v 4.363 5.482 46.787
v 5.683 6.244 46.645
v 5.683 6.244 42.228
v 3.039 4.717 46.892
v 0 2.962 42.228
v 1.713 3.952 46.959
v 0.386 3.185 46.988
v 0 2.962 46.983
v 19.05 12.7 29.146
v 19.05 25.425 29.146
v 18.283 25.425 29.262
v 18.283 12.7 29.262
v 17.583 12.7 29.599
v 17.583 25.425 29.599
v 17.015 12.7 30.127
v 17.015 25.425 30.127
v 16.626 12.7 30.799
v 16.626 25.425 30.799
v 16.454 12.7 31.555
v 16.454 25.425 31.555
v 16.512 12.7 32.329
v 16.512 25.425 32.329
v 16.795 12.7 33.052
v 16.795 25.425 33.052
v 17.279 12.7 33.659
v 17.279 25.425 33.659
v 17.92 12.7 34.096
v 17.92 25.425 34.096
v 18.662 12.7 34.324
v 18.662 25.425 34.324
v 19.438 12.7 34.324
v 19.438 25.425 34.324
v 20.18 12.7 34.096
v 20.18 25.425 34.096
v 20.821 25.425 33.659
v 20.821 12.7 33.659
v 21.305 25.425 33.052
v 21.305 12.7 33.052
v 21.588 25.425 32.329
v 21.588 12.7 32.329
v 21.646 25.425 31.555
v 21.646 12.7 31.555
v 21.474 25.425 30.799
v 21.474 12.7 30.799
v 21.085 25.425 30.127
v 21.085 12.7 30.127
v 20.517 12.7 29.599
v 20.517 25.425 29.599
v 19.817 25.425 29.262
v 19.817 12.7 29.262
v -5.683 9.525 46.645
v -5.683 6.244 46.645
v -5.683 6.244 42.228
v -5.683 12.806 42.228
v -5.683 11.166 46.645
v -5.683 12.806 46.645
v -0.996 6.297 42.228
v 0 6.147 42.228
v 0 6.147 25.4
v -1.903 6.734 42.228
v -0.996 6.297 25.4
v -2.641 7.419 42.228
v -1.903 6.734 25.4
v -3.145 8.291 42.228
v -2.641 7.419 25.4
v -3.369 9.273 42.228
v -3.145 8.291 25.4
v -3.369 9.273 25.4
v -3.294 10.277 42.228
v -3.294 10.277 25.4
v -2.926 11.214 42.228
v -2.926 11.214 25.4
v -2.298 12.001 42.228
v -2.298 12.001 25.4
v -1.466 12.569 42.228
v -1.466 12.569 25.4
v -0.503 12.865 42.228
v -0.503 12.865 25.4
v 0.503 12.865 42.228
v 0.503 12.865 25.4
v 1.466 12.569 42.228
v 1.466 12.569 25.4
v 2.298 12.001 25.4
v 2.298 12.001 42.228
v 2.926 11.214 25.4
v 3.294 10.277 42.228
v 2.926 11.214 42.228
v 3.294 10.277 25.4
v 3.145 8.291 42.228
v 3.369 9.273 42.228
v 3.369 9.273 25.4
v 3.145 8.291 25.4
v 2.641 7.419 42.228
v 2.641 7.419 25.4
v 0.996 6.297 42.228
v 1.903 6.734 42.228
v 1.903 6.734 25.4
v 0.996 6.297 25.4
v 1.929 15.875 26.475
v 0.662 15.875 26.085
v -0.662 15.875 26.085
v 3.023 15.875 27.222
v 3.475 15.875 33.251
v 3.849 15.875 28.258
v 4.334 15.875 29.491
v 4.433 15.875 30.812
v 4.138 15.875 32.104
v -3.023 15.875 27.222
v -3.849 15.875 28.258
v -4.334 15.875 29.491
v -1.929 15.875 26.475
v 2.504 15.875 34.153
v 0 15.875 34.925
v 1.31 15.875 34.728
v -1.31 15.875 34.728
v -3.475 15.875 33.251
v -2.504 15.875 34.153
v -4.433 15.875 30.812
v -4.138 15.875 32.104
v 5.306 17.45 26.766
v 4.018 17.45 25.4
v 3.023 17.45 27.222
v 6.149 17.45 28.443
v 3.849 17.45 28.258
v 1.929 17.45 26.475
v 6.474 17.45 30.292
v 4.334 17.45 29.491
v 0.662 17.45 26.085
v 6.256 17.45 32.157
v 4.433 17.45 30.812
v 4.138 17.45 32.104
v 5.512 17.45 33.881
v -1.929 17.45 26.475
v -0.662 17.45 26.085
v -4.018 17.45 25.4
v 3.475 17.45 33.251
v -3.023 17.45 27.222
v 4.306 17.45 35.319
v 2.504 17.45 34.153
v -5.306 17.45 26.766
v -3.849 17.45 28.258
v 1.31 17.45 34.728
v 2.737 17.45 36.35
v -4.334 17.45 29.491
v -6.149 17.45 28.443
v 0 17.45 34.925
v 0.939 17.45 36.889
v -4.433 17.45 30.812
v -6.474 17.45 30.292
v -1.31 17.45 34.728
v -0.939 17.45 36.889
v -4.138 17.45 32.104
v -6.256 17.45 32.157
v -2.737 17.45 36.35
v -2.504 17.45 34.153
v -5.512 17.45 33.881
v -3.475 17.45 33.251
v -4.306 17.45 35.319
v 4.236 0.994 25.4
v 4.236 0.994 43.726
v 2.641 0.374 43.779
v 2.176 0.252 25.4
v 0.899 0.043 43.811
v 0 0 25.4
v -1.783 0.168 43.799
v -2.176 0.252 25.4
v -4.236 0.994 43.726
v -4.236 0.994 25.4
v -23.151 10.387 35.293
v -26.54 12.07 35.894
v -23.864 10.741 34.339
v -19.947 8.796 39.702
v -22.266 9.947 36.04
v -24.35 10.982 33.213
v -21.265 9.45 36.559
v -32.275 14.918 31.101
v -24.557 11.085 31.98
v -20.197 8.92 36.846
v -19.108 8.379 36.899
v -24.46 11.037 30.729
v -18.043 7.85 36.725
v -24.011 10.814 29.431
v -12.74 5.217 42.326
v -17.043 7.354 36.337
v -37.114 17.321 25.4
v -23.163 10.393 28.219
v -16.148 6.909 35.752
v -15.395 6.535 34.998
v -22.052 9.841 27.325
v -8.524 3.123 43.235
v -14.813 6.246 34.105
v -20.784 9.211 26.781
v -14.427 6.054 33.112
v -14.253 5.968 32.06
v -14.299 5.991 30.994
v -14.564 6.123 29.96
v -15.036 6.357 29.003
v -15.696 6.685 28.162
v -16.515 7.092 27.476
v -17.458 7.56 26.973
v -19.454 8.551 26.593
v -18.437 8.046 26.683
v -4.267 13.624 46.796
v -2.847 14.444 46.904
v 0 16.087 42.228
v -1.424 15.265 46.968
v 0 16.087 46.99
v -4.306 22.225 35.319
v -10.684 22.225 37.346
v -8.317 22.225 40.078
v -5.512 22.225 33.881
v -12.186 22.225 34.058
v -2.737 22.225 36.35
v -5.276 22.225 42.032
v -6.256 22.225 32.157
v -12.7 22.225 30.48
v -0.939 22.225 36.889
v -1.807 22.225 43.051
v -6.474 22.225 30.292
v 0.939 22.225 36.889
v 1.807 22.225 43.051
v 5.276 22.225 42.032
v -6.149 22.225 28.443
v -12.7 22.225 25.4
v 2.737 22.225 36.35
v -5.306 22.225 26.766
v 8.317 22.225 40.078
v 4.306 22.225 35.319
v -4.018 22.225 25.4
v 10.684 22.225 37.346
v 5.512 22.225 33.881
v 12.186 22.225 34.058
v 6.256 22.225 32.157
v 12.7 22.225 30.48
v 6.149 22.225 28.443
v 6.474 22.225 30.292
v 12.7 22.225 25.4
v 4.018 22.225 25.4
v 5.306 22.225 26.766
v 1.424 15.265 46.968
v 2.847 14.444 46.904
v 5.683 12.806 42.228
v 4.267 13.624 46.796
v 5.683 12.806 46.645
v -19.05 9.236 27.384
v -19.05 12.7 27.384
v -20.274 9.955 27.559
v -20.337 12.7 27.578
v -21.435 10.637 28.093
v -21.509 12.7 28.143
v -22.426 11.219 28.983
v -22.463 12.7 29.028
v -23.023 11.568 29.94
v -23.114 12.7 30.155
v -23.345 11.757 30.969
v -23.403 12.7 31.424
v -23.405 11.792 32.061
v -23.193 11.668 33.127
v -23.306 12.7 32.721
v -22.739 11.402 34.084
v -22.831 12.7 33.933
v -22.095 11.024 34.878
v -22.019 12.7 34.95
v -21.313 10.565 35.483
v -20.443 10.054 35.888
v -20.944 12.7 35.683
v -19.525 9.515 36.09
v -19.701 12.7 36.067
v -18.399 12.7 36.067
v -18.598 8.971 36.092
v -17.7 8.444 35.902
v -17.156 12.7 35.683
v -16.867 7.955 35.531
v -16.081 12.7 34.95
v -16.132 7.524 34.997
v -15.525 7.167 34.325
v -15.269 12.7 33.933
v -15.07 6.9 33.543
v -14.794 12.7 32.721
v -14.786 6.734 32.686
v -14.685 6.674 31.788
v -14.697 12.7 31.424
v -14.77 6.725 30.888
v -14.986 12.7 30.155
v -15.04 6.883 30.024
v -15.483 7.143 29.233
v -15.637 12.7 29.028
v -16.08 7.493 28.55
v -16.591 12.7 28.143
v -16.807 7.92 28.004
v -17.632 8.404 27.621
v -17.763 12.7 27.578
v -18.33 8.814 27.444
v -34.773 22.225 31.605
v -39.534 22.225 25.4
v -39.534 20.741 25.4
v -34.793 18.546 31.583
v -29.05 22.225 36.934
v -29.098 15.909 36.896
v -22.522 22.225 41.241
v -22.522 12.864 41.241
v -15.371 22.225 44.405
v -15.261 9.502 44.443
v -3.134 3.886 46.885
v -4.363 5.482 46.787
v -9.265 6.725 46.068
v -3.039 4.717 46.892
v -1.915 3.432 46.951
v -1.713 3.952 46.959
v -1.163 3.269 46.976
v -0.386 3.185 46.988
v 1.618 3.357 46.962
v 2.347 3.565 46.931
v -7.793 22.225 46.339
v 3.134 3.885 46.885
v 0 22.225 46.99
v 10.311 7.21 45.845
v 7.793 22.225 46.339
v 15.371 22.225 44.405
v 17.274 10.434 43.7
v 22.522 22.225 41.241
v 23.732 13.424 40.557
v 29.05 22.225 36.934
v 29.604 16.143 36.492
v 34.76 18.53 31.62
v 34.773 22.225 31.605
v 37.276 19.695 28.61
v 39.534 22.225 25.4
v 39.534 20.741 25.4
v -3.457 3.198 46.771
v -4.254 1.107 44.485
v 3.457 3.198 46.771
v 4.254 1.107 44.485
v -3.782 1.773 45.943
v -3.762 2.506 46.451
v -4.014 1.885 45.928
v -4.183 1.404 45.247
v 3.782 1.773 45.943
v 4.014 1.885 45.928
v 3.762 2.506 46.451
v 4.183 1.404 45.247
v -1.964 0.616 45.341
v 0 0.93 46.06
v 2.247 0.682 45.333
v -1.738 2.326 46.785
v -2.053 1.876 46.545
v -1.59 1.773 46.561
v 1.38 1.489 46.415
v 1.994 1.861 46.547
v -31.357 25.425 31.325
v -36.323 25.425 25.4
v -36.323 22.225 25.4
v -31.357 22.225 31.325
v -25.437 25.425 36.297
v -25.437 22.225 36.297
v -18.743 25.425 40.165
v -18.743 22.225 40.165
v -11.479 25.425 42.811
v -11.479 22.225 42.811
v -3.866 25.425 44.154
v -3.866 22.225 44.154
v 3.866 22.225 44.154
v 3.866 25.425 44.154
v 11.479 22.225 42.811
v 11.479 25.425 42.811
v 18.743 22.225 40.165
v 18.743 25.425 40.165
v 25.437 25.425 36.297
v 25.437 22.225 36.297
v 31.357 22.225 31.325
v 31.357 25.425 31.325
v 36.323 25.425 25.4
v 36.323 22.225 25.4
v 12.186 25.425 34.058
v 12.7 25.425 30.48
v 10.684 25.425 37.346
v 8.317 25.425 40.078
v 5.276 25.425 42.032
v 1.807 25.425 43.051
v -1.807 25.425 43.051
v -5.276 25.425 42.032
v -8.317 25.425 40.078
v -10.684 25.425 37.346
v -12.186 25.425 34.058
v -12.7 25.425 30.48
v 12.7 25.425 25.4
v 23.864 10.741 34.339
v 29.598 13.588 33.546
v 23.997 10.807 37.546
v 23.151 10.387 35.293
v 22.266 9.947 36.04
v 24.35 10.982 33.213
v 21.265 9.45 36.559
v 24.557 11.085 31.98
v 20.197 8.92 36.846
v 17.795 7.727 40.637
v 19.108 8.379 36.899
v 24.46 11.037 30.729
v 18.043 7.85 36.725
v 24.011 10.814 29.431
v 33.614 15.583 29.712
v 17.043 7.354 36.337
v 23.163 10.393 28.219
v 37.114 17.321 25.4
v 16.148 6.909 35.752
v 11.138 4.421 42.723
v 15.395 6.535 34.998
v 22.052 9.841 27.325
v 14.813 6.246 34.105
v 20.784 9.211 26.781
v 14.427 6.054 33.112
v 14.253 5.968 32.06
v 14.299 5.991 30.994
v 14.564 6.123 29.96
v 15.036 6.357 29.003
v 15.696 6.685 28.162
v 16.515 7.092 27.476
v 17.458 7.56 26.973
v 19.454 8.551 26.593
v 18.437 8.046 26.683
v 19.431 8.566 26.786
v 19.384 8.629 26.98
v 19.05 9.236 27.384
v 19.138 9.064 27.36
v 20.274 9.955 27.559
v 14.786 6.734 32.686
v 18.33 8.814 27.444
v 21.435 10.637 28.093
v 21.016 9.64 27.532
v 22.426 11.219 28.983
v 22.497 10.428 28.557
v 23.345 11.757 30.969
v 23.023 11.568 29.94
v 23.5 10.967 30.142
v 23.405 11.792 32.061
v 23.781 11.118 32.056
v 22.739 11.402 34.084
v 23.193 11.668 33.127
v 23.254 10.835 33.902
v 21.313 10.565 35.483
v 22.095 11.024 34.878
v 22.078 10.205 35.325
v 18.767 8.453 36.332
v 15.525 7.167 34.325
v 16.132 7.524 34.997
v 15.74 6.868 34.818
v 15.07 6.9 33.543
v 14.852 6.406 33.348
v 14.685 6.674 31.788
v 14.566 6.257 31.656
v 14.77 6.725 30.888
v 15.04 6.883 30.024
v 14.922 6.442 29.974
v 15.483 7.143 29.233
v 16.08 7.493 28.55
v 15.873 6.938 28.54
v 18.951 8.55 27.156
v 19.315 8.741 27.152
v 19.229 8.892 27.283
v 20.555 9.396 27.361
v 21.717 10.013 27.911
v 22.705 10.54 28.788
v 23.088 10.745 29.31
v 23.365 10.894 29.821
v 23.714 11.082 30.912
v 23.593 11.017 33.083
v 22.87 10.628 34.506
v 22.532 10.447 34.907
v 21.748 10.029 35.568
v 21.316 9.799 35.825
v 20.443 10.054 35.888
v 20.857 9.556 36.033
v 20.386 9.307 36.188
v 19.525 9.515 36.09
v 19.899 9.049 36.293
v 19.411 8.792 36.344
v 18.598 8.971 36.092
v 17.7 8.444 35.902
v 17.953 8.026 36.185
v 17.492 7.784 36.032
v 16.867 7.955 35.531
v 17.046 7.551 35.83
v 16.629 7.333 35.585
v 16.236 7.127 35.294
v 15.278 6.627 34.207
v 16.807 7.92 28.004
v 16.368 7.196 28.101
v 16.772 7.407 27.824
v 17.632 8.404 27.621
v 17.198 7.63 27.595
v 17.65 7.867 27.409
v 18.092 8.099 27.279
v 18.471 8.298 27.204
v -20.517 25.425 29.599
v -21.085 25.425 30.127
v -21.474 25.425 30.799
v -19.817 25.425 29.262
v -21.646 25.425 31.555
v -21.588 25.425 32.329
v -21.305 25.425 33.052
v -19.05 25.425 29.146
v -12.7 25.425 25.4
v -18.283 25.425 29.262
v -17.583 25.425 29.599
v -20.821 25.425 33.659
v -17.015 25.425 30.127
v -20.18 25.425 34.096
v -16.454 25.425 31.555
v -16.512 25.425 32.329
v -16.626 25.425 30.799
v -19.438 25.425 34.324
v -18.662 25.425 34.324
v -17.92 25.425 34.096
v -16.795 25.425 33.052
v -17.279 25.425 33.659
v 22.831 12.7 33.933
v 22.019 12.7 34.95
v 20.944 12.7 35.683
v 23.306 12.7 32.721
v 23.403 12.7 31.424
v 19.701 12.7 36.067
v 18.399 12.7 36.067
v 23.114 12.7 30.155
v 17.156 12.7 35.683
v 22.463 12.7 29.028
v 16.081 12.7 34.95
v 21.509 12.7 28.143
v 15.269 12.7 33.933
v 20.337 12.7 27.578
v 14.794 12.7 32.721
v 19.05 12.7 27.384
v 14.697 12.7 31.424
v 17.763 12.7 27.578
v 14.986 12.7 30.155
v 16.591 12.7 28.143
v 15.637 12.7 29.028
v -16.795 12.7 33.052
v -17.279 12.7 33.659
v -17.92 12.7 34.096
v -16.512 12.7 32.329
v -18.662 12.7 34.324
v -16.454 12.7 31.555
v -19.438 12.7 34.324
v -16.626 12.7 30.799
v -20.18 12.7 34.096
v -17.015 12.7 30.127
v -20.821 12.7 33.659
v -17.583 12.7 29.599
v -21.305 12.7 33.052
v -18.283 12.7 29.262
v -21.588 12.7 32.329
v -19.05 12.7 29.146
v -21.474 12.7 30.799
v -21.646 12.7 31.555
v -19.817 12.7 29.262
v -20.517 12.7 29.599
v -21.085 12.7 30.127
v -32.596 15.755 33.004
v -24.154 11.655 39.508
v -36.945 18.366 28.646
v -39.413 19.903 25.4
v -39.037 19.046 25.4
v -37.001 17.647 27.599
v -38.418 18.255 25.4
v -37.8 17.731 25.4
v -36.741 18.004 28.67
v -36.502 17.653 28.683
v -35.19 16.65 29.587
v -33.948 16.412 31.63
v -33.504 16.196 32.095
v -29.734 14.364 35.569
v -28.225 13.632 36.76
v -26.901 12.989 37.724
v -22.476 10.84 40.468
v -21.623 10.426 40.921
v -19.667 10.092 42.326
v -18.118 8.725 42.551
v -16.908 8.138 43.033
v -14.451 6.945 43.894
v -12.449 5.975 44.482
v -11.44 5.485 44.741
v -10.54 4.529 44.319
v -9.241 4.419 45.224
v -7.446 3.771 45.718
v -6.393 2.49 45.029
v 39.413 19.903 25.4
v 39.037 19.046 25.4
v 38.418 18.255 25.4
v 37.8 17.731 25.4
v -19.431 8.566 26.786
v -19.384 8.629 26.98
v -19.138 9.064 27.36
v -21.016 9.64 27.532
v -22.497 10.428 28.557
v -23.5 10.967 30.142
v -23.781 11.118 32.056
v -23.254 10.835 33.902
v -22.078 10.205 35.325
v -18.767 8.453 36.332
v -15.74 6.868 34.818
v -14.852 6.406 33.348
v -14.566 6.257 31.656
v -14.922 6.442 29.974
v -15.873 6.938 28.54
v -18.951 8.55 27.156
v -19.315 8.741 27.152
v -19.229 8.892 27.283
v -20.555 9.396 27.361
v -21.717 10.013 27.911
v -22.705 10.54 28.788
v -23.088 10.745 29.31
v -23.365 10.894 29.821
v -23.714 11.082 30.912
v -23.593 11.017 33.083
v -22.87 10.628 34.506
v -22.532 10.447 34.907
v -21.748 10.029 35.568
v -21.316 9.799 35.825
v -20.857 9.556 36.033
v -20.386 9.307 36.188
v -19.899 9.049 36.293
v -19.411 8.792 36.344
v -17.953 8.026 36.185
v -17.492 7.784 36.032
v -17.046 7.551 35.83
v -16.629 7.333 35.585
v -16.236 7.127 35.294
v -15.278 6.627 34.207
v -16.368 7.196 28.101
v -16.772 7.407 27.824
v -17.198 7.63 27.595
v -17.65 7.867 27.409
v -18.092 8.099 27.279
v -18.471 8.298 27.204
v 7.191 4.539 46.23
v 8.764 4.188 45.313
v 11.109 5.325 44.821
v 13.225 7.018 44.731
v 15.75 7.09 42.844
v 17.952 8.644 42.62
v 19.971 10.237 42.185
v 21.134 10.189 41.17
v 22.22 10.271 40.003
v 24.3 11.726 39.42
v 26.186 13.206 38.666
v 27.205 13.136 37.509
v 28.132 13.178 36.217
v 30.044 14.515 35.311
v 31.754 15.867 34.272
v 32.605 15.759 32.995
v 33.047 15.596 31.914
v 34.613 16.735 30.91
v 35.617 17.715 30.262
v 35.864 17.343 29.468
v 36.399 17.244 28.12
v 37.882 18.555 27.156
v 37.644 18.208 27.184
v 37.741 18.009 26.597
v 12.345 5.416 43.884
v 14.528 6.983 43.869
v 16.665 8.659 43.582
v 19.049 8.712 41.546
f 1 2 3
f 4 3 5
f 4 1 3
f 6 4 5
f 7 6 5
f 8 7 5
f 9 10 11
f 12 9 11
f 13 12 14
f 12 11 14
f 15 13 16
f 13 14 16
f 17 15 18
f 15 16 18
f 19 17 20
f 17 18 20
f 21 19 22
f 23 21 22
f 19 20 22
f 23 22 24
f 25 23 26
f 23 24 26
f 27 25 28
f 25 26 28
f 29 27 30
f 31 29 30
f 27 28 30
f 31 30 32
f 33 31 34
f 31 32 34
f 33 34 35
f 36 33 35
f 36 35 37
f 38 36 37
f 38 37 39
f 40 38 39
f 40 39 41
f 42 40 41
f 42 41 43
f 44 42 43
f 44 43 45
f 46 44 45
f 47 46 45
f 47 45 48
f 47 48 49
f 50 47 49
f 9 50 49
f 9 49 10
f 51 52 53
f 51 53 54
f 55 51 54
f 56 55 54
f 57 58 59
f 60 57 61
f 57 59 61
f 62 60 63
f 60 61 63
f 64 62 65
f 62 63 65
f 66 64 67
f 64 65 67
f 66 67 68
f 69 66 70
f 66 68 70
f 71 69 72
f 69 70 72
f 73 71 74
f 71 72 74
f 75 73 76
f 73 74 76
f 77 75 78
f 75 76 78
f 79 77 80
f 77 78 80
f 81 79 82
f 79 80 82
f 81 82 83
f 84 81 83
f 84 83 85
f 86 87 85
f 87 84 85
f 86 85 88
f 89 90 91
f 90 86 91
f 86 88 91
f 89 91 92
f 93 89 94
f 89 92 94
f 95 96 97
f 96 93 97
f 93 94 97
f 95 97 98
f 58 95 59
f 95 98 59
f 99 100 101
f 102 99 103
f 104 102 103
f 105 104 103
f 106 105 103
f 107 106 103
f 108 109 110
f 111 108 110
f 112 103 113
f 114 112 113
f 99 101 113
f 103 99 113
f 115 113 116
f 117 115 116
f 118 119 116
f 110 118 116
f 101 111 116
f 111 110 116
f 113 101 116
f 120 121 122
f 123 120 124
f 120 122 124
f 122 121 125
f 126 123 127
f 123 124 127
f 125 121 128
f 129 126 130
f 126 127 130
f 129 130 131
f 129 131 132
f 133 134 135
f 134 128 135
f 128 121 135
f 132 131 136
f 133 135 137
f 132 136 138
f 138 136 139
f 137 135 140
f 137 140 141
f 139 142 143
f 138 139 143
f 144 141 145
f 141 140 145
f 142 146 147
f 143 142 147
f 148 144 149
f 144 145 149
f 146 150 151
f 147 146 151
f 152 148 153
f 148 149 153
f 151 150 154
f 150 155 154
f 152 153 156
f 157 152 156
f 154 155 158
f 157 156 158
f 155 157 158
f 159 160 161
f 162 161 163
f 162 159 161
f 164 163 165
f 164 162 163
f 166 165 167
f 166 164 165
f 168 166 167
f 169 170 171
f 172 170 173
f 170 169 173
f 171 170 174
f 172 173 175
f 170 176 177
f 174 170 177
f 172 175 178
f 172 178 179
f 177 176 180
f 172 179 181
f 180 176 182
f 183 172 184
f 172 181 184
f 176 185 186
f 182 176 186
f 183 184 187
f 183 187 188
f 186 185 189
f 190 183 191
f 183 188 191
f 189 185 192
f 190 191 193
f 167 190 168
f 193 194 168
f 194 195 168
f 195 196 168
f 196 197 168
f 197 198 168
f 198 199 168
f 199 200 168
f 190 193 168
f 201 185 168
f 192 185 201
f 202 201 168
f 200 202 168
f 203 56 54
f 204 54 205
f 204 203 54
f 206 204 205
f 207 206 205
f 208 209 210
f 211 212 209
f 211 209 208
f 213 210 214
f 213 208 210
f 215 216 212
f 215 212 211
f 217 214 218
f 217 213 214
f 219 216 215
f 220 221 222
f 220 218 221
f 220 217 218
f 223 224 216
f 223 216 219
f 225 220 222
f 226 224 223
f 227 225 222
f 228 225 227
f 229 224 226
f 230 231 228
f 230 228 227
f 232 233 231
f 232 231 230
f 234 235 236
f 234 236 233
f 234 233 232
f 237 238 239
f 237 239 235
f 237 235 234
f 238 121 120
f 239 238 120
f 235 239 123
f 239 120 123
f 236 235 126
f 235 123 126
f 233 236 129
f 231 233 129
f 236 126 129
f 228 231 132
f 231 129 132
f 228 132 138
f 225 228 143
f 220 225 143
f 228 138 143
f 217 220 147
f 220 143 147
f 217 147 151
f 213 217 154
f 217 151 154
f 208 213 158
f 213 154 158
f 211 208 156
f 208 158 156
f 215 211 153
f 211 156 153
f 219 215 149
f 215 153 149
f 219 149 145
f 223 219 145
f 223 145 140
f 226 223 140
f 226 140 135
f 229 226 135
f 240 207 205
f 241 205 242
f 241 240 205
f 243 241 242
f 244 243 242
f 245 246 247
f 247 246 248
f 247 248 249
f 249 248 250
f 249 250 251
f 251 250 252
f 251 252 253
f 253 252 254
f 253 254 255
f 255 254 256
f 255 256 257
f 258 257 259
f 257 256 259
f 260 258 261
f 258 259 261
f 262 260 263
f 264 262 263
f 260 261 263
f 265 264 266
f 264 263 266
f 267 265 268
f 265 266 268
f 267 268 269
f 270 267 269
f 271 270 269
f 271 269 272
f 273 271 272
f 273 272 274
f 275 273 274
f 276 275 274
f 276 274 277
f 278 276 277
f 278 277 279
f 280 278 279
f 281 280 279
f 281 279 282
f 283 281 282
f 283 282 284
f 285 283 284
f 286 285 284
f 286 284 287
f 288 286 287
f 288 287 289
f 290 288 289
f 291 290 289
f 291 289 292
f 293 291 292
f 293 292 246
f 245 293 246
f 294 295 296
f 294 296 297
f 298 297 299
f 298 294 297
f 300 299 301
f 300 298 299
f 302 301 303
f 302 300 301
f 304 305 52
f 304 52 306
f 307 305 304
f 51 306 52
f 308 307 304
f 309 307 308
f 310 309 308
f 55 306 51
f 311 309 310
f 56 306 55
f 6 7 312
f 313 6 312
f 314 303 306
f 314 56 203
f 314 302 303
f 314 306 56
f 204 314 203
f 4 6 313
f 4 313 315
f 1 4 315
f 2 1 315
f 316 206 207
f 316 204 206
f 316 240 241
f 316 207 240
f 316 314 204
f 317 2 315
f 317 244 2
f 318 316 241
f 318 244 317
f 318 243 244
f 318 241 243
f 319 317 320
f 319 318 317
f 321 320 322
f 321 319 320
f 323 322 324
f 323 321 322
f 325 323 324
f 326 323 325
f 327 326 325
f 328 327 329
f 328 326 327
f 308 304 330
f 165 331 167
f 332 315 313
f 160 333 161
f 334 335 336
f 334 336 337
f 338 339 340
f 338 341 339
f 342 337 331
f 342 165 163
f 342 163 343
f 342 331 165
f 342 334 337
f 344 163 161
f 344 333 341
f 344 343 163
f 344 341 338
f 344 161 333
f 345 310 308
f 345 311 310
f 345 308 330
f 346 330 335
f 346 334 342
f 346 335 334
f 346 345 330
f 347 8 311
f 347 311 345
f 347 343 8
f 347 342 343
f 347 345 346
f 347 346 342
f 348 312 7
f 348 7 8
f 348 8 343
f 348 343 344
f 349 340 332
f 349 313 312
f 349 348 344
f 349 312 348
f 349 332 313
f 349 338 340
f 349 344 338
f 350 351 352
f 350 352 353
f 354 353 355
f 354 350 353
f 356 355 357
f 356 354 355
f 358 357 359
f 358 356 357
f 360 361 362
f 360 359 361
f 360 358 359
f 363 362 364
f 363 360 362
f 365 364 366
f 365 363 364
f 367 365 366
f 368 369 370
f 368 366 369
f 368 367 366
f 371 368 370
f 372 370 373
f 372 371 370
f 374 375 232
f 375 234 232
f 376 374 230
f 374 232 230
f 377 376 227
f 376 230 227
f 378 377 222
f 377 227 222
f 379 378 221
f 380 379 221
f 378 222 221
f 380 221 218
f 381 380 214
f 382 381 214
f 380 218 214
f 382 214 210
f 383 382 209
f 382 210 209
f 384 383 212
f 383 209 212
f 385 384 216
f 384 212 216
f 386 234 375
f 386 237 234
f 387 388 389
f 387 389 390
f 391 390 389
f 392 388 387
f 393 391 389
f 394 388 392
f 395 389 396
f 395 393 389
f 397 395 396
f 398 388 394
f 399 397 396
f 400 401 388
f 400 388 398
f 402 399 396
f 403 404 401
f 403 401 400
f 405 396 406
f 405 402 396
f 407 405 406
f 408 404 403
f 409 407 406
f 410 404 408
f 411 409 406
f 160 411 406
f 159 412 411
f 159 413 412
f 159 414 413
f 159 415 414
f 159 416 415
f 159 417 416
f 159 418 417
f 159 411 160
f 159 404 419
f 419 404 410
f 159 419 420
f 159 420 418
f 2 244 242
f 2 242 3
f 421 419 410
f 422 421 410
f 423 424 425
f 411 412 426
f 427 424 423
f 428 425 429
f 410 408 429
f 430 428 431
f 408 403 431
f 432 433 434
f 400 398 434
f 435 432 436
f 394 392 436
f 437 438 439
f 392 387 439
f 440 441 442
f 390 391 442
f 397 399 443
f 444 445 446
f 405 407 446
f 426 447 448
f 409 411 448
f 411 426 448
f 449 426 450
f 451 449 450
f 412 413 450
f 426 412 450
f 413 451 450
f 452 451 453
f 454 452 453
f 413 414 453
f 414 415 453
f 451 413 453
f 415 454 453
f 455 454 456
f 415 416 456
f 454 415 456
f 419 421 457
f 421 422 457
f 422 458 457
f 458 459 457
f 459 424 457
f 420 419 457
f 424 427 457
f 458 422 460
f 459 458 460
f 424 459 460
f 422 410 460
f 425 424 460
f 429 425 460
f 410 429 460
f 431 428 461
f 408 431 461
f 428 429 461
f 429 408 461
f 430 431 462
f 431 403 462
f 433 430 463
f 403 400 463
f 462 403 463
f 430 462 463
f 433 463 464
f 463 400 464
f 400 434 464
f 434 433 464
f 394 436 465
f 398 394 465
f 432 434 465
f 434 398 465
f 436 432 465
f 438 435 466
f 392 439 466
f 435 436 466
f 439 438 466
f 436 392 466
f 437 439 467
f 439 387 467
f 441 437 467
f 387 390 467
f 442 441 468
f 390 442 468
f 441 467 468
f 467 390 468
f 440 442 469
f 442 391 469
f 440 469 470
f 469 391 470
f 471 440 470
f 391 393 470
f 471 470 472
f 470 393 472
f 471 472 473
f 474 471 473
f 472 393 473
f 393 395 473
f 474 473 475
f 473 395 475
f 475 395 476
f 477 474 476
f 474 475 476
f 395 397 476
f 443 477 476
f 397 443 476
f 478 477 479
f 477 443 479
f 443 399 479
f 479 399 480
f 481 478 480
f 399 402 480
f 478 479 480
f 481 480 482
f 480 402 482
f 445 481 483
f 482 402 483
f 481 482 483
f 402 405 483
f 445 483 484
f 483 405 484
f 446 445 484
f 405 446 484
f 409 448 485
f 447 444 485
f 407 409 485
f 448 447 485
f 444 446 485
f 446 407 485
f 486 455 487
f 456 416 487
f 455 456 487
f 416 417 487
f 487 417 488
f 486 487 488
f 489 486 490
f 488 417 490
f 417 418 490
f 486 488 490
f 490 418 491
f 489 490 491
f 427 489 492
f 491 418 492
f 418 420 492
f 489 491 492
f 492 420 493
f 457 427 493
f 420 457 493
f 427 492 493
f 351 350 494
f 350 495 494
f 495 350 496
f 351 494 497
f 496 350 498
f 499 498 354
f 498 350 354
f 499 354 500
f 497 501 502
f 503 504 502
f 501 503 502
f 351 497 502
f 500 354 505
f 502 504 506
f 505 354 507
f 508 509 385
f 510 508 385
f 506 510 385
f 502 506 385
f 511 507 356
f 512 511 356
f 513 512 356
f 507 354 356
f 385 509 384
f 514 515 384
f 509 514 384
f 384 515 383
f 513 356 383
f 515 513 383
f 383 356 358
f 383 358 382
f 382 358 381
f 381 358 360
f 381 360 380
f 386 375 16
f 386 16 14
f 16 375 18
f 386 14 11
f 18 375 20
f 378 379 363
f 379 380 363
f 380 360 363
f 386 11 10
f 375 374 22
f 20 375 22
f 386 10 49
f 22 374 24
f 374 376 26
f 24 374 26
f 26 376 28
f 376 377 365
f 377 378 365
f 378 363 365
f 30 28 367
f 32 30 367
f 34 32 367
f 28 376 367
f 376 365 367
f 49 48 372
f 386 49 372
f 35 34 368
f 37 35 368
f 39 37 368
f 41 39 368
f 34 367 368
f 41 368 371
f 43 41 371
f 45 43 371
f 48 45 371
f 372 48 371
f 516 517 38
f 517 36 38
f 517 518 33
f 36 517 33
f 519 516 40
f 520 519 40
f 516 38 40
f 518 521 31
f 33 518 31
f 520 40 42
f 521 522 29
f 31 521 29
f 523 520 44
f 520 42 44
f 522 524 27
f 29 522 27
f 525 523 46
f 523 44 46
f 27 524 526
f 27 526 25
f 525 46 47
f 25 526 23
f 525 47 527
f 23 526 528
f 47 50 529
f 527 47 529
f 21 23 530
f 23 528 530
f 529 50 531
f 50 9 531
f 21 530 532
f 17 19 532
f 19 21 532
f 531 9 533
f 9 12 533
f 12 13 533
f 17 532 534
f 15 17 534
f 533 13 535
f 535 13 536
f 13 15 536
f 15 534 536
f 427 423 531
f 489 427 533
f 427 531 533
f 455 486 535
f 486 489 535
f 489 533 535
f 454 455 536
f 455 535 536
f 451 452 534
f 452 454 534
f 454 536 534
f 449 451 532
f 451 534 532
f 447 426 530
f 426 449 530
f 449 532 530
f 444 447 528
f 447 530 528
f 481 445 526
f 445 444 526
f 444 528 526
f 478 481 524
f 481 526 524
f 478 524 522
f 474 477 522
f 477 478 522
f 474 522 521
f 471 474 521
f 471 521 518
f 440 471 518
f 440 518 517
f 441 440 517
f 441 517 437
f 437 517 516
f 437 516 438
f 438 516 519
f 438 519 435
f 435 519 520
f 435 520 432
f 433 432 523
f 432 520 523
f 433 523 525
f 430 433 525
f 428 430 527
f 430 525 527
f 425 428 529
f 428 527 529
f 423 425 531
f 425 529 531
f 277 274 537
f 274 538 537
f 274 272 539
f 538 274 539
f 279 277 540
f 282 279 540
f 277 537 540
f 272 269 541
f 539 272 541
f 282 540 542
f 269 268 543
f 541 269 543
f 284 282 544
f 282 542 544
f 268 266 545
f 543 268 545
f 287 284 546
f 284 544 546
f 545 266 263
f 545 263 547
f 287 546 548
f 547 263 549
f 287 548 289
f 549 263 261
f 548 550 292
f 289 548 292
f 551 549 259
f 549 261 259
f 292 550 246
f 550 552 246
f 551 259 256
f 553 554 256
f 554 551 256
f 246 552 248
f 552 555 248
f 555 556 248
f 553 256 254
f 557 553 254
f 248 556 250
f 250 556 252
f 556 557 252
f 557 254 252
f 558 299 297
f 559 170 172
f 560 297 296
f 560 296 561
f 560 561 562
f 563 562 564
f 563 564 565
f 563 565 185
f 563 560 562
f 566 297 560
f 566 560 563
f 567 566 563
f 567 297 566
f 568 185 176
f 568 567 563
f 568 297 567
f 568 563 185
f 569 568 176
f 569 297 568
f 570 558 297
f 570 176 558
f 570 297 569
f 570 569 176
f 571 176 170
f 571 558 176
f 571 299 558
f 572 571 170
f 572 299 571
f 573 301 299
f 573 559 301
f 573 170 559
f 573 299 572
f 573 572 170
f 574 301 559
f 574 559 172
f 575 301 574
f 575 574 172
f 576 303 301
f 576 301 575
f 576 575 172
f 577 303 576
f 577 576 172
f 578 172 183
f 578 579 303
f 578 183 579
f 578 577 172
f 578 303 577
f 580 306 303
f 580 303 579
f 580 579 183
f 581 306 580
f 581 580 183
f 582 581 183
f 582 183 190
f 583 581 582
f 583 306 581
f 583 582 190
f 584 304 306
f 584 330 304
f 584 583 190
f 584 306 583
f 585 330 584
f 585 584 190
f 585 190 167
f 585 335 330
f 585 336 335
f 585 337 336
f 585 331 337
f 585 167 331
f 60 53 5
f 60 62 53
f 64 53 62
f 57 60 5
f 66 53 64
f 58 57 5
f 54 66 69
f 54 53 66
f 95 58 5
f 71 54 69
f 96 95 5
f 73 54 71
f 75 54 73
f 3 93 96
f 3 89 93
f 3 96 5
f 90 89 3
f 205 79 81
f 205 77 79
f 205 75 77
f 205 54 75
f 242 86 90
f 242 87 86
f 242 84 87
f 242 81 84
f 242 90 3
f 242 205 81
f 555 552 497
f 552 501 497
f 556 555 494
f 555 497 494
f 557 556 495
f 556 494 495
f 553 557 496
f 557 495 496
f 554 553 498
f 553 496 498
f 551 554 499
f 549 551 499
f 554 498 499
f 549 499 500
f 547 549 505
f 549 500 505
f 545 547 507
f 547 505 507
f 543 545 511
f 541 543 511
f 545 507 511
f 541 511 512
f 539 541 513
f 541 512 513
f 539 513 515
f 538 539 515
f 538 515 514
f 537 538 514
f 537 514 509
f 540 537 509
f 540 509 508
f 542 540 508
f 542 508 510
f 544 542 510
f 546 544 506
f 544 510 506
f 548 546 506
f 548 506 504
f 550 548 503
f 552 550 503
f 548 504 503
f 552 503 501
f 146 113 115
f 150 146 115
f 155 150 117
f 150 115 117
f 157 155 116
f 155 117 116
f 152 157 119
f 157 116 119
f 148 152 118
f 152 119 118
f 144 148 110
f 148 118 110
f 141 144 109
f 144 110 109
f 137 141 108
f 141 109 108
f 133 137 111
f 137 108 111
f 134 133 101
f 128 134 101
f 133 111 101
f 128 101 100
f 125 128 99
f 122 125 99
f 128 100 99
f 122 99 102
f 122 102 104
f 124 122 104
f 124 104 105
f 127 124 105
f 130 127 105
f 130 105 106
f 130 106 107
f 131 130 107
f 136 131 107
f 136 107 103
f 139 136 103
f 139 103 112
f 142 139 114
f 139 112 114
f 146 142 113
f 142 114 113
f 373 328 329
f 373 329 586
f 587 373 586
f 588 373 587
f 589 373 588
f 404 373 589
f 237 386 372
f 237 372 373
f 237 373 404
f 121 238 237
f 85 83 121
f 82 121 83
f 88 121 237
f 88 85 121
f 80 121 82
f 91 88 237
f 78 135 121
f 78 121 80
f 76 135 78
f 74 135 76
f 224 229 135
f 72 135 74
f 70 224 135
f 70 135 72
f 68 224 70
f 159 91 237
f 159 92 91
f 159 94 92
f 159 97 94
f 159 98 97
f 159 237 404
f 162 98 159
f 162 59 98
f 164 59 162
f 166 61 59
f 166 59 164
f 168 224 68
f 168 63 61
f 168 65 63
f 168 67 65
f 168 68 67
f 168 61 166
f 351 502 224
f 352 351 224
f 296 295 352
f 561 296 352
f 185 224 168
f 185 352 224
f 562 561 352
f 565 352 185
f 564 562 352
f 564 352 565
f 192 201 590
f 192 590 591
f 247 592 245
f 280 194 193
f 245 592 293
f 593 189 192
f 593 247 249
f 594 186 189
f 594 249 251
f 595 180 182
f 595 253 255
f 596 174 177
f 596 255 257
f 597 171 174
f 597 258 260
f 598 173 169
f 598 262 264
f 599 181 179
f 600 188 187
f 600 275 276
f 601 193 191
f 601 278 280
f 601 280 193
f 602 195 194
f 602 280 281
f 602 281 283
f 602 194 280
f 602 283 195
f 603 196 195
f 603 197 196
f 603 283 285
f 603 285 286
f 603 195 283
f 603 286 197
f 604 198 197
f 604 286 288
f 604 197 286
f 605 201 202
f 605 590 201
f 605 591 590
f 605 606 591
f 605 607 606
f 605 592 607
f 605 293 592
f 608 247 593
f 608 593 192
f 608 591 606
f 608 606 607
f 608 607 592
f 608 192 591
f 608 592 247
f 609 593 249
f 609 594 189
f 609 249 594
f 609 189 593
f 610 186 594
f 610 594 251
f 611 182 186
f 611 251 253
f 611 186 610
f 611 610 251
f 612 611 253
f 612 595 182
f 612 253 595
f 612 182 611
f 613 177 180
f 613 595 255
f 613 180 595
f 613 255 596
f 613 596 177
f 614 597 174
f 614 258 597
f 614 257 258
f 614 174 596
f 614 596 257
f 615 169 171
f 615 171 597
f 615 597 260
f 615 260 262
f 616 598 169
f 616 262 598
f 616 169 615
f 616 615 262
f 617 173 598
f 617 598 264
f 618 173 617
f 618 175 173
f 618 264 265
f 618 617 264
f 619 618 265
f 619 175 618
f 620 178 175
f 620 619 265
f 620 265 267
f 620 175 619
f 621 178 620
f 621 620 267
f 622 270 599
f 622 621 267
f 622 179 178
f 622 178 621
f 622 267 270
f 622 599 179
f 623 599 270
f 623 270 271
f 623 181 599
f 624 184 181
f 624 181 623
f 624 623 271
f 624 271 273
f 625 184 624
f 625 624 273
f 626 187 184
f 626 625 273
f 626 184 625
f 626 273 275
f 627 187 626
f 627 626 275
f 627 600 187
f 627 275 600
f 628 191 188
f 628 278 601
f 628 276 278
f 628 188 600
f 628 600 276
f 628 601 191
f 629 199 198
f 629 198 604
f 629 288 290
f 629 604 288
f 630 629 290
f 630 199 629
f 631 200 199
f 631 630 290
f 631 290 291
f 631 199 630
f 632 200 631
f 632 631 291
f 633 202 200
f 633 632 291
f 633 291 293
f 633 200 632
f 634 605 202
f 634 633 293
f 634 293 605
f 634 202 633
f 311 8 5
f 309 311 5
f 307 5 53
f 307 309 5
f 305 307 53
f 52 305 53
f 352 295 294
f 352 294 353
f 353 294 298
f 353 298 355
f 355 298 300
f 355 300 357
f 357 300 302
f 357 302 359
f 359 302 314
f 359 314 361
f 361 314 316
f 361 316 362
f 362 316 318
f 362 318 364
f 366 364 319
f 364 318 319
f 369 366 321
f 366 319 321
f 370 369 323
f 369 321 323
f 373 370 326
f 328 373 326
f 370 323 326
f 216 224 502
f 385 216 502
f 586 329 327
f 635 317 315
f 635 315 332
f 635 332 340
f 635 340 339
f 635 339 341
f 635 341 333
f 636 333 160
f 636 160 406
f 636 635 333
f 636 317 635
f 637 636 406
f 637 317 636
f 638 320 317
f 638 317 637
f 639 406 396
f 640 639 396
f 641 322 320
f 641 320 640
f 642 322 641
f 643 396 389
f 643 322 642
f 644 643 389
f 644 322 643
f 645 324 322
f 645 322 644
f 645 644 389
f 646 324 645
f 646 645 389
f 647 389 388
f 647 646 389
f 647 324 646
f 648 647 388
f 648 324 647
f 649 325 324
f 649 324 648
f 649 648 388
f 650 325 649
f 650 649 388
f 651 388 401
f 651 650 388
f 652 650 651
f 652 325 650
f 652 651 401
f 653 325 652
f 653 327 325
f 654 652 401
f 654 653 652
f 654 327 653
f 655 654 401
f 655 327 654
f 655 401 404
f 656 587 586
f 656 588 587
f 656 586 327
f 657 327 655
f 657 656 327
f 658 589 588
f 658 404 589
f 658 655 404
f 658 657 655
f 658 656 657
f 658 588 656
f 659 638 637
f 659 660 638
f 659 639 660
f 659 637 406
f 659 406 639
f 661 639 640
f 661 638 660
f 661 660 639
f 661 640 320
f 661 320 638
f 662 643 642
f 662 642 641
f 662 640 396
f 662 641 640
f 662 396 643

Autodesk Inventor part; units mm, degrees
ref_plane "YZ Plane" through (0, 0, 0) normal (1, 0, 0) x (0, 1, 0)
sketch "Sketch1" plane through (0, 0, 0) normal (0, 0, 1) x (1, 0, 0)
  line L0 (0, 0) -> (46.99, 0)
  line L1 (46.99, 0) -> (46.99, 22.225)
  line L2 (46.99, 22.225) -> (0, 22.225)
  line L3 (0, 22.225) -> (0, 0)
  line L4 (0, 22.225) -> (44.323, 22.225)
  line L5 (44.323, 22.225) -> (44.323, 25.4254)
  line L6 (44.323, 25.4254) -> (0, 25.4254)
  line L7 (0, 25.4254) -> (0, 22.225)
  circle A0 centre (0, 9.525) radius 9.525
  circle A1 centre (0, 9.525) radius 3.175
  line L8 (46.99, 22.225) -> (4.2364, 0.994)
  line L9 (0, 0) -> (-46.99, 0)
  line L10 (-46.99, 0) -> (-46.99, 22.225)
  line L11 (-46.99, 22.225) -> (0, 22.225)
  line L12 (0, 22.225) -> (0, 0)
  line L13 (-46.99, 22.225) -> (-4.2364, 0.994)
  dimension "d2" = 44.323
  dimension "d3" = 3.2004
  dimension "d5" = 6.35
  dimension "d7" = 6.35
  dimension "d67" = 12.7
  dimension "d119" = 46.99
revolve "Revolution1" add sketch "Sketch1" angle 180 about axis through (0, 22.225, 0) along (0, -1, 0) picked at (0.942, 16.8272) picked at (0.9535, 9.9842) contours A0 L8 L1 L0 | L3 A1 A0 | L3 A1 | A0 L3 L2 L8 | L2 L7 L6 L5
sketch "Sketch2" plane through (0, 0, 0) normal (1, 0, 0) x (0, 1, 0)
  line L0 (0, 0) -> (22.225, 0) projected
  line L1 (25.4254, 44.323) -> (25.4254, 0) projected
  line L2 (0, 0) -> (25.4254, 0)
  line L3 (25.4254, 0) -> (25.4254, 25.4)
  line L4 (25.4254, 25.4) -> (0, 25.4)
  line L5 (0, 25.4) -> (0, 0)
  dimension "d10" = 25.4
extrude "Extrusion1" cut sketch "Sketch2" along normal through all both and the other way through all
extrude "Extrusion2" cut sketch "Sketch1" along normal through all contours A0 L8 L1 L0 | L9 L10 L13 A0
ref_plane "Work Plane1" through (0, 0, 0) normal (0, 1, 0) x (-1, 0, 0)
sketch "Sketch9" plane through (0, 0, 0) normal (0, 1, 0) x (-1, 0, 0)
  line L0 (-19.05, 31.75) -> (0, 0) construction
  line L1 (0, 0) -> (19.05, 31.75) construction
  dimension "d46" = 31.75
  dimension "d47" = 38.1
hole "Hole1" at (19.05, 0, 31.75) at (-19.05, 0, 31.75) direction (0, 1, 0) diameter 5.207 end through all counterbore diameter 8.7313 counterbore depth 12.7
ref_plane "Work Plane2" through (0, 11.1125, 46.99) normal (0, 0, 1) x (1, 0, 0)
sketch "Sketch10" plane through (0, 11.1125, 46.99) normal (0, 0, 1) x (1, 0, 0)
  arc A0 (-4.2364, -10.1185) -> (4.2364, -10.1185) centre (0, -1.5875) ccw projected
  point P0 (0, -11.1125)
hole "Hole2" at (0, 9.525, 46.99) direction (0, 0, -1) diameter 6.7564 end through all
fillet "Fillet1" radius 0.7937 4 edges at (19.05, 8.3503, 36.1156) (-19.05, 8.3503, 36.1156) (-3.3781, 9.4995, 46.8684) (3.3781, 9.4966, 46.8684)
fillet "Fillet2" radius 3.175 4 edges at (2.2299, 0.2647, 46.9371) (-2.2284, 0.2643, 46.9371) (-24.3604, 10.9873, 40.1825) (24.3604, 10.9873, 40.1825)
sketch "Sketch12" plane through (0, 0, 0) normal (1, 0, 0) x (0, 1, 0)
  line L0 (12.9032, 25.4) -> (6.1468, 25.4) projected
  line L1 (22.225, 17.78) -> (22.225, 30.48)
  line L2 (43.3764, 30.48) -> (22.225, 30.48)
  line L3 (43.3764, 30.48) -> (43.3764, 17.78)
  line L4 (43.3764, 17.78) -> (22.225, 17.78)
  point P0 (0, 0)
  point P1 (9.525, 25.4)
  dimension "d108" = 12.7
  dimension "d111" = 30.48
  dimension "d120" = 12.7
revolve "Revolution2" cut sketch "Sketch12" angle 360 about axis through (0, 43.3764, 30.48) along (0, -1, 0)
sketch "Sketch13" plane through (0, 11.1125, 46.99) normal (0, 0, 1) x (1, 0, 0)
  circle A0 centre (0, -1.5875) radius 3.3782 projected
  line L0 (0, 4.975) -> (5.6832, 1.6937)
  line L1 (5.6832, 1.6937) -> (5.6832, -4.8687)
  line L2 (5.6832, -4.8687) -> (0, -8.15)
  line L3 (0, -8.15) -> (-5.6833, -4.8687)
  line L4 (-5.6833, -4.8687) -> (-5.6832, 1.6937)
  line L5 (-5.6832, 1.6937) -> (0, 4.975)
  point P0 (0, -11.1125)
  dimension "d91" = 11.3665
extrude "Extrusion8" cut sketch "Sketch13" against normal blind 4.7625
sketch "Sketch14" plane through (39.5335, 22.225, 25.4) normal (0, 0, -1) x (-1, 0, 0)
  line L0 (26.8335, 0) -> (26.8335, 3.2004) projected
  line L1 (52.2335, 0) -> (52.2335, 3.2004) projected
  line L2 (52.2335, 0) -> (26.8335, 0) projected
  line L3 (26.8335, 3.2004) -> (52.2335, 3.2004) projected
  point P0 (39.5335, -22.225)
  point P1 (51.1733, 0)
  point P2 (27.8938, 0)
  point P3 (27.8938, 3.2004)
  point P4 (51.1733, 3.2004)
extrude "Extrusion9" cut sketch "Sketch14" against normal blind 5.08
sketch "Sketch15" plane through (0, 22.225, 30.48) normal (0, 1, 0) x (1, 0, 0)
  circle A0 centre (0, 0) radius 6.477
  arc A1 (-12.7, 0) -> (12.7, 0) centre (0, 0) ccw projected
  point P0 (0, 30.48)
  dimension "d98" = 12.954
hole "Hole5" at (0, 22.225, 30.48) direction (0, -1, 0) diameter 8.89 depth 6.35 counterbore diameter 12.954 counterbore depth 4.7752
properties part number "WheelBracketHead" material "ABS Plastic"
